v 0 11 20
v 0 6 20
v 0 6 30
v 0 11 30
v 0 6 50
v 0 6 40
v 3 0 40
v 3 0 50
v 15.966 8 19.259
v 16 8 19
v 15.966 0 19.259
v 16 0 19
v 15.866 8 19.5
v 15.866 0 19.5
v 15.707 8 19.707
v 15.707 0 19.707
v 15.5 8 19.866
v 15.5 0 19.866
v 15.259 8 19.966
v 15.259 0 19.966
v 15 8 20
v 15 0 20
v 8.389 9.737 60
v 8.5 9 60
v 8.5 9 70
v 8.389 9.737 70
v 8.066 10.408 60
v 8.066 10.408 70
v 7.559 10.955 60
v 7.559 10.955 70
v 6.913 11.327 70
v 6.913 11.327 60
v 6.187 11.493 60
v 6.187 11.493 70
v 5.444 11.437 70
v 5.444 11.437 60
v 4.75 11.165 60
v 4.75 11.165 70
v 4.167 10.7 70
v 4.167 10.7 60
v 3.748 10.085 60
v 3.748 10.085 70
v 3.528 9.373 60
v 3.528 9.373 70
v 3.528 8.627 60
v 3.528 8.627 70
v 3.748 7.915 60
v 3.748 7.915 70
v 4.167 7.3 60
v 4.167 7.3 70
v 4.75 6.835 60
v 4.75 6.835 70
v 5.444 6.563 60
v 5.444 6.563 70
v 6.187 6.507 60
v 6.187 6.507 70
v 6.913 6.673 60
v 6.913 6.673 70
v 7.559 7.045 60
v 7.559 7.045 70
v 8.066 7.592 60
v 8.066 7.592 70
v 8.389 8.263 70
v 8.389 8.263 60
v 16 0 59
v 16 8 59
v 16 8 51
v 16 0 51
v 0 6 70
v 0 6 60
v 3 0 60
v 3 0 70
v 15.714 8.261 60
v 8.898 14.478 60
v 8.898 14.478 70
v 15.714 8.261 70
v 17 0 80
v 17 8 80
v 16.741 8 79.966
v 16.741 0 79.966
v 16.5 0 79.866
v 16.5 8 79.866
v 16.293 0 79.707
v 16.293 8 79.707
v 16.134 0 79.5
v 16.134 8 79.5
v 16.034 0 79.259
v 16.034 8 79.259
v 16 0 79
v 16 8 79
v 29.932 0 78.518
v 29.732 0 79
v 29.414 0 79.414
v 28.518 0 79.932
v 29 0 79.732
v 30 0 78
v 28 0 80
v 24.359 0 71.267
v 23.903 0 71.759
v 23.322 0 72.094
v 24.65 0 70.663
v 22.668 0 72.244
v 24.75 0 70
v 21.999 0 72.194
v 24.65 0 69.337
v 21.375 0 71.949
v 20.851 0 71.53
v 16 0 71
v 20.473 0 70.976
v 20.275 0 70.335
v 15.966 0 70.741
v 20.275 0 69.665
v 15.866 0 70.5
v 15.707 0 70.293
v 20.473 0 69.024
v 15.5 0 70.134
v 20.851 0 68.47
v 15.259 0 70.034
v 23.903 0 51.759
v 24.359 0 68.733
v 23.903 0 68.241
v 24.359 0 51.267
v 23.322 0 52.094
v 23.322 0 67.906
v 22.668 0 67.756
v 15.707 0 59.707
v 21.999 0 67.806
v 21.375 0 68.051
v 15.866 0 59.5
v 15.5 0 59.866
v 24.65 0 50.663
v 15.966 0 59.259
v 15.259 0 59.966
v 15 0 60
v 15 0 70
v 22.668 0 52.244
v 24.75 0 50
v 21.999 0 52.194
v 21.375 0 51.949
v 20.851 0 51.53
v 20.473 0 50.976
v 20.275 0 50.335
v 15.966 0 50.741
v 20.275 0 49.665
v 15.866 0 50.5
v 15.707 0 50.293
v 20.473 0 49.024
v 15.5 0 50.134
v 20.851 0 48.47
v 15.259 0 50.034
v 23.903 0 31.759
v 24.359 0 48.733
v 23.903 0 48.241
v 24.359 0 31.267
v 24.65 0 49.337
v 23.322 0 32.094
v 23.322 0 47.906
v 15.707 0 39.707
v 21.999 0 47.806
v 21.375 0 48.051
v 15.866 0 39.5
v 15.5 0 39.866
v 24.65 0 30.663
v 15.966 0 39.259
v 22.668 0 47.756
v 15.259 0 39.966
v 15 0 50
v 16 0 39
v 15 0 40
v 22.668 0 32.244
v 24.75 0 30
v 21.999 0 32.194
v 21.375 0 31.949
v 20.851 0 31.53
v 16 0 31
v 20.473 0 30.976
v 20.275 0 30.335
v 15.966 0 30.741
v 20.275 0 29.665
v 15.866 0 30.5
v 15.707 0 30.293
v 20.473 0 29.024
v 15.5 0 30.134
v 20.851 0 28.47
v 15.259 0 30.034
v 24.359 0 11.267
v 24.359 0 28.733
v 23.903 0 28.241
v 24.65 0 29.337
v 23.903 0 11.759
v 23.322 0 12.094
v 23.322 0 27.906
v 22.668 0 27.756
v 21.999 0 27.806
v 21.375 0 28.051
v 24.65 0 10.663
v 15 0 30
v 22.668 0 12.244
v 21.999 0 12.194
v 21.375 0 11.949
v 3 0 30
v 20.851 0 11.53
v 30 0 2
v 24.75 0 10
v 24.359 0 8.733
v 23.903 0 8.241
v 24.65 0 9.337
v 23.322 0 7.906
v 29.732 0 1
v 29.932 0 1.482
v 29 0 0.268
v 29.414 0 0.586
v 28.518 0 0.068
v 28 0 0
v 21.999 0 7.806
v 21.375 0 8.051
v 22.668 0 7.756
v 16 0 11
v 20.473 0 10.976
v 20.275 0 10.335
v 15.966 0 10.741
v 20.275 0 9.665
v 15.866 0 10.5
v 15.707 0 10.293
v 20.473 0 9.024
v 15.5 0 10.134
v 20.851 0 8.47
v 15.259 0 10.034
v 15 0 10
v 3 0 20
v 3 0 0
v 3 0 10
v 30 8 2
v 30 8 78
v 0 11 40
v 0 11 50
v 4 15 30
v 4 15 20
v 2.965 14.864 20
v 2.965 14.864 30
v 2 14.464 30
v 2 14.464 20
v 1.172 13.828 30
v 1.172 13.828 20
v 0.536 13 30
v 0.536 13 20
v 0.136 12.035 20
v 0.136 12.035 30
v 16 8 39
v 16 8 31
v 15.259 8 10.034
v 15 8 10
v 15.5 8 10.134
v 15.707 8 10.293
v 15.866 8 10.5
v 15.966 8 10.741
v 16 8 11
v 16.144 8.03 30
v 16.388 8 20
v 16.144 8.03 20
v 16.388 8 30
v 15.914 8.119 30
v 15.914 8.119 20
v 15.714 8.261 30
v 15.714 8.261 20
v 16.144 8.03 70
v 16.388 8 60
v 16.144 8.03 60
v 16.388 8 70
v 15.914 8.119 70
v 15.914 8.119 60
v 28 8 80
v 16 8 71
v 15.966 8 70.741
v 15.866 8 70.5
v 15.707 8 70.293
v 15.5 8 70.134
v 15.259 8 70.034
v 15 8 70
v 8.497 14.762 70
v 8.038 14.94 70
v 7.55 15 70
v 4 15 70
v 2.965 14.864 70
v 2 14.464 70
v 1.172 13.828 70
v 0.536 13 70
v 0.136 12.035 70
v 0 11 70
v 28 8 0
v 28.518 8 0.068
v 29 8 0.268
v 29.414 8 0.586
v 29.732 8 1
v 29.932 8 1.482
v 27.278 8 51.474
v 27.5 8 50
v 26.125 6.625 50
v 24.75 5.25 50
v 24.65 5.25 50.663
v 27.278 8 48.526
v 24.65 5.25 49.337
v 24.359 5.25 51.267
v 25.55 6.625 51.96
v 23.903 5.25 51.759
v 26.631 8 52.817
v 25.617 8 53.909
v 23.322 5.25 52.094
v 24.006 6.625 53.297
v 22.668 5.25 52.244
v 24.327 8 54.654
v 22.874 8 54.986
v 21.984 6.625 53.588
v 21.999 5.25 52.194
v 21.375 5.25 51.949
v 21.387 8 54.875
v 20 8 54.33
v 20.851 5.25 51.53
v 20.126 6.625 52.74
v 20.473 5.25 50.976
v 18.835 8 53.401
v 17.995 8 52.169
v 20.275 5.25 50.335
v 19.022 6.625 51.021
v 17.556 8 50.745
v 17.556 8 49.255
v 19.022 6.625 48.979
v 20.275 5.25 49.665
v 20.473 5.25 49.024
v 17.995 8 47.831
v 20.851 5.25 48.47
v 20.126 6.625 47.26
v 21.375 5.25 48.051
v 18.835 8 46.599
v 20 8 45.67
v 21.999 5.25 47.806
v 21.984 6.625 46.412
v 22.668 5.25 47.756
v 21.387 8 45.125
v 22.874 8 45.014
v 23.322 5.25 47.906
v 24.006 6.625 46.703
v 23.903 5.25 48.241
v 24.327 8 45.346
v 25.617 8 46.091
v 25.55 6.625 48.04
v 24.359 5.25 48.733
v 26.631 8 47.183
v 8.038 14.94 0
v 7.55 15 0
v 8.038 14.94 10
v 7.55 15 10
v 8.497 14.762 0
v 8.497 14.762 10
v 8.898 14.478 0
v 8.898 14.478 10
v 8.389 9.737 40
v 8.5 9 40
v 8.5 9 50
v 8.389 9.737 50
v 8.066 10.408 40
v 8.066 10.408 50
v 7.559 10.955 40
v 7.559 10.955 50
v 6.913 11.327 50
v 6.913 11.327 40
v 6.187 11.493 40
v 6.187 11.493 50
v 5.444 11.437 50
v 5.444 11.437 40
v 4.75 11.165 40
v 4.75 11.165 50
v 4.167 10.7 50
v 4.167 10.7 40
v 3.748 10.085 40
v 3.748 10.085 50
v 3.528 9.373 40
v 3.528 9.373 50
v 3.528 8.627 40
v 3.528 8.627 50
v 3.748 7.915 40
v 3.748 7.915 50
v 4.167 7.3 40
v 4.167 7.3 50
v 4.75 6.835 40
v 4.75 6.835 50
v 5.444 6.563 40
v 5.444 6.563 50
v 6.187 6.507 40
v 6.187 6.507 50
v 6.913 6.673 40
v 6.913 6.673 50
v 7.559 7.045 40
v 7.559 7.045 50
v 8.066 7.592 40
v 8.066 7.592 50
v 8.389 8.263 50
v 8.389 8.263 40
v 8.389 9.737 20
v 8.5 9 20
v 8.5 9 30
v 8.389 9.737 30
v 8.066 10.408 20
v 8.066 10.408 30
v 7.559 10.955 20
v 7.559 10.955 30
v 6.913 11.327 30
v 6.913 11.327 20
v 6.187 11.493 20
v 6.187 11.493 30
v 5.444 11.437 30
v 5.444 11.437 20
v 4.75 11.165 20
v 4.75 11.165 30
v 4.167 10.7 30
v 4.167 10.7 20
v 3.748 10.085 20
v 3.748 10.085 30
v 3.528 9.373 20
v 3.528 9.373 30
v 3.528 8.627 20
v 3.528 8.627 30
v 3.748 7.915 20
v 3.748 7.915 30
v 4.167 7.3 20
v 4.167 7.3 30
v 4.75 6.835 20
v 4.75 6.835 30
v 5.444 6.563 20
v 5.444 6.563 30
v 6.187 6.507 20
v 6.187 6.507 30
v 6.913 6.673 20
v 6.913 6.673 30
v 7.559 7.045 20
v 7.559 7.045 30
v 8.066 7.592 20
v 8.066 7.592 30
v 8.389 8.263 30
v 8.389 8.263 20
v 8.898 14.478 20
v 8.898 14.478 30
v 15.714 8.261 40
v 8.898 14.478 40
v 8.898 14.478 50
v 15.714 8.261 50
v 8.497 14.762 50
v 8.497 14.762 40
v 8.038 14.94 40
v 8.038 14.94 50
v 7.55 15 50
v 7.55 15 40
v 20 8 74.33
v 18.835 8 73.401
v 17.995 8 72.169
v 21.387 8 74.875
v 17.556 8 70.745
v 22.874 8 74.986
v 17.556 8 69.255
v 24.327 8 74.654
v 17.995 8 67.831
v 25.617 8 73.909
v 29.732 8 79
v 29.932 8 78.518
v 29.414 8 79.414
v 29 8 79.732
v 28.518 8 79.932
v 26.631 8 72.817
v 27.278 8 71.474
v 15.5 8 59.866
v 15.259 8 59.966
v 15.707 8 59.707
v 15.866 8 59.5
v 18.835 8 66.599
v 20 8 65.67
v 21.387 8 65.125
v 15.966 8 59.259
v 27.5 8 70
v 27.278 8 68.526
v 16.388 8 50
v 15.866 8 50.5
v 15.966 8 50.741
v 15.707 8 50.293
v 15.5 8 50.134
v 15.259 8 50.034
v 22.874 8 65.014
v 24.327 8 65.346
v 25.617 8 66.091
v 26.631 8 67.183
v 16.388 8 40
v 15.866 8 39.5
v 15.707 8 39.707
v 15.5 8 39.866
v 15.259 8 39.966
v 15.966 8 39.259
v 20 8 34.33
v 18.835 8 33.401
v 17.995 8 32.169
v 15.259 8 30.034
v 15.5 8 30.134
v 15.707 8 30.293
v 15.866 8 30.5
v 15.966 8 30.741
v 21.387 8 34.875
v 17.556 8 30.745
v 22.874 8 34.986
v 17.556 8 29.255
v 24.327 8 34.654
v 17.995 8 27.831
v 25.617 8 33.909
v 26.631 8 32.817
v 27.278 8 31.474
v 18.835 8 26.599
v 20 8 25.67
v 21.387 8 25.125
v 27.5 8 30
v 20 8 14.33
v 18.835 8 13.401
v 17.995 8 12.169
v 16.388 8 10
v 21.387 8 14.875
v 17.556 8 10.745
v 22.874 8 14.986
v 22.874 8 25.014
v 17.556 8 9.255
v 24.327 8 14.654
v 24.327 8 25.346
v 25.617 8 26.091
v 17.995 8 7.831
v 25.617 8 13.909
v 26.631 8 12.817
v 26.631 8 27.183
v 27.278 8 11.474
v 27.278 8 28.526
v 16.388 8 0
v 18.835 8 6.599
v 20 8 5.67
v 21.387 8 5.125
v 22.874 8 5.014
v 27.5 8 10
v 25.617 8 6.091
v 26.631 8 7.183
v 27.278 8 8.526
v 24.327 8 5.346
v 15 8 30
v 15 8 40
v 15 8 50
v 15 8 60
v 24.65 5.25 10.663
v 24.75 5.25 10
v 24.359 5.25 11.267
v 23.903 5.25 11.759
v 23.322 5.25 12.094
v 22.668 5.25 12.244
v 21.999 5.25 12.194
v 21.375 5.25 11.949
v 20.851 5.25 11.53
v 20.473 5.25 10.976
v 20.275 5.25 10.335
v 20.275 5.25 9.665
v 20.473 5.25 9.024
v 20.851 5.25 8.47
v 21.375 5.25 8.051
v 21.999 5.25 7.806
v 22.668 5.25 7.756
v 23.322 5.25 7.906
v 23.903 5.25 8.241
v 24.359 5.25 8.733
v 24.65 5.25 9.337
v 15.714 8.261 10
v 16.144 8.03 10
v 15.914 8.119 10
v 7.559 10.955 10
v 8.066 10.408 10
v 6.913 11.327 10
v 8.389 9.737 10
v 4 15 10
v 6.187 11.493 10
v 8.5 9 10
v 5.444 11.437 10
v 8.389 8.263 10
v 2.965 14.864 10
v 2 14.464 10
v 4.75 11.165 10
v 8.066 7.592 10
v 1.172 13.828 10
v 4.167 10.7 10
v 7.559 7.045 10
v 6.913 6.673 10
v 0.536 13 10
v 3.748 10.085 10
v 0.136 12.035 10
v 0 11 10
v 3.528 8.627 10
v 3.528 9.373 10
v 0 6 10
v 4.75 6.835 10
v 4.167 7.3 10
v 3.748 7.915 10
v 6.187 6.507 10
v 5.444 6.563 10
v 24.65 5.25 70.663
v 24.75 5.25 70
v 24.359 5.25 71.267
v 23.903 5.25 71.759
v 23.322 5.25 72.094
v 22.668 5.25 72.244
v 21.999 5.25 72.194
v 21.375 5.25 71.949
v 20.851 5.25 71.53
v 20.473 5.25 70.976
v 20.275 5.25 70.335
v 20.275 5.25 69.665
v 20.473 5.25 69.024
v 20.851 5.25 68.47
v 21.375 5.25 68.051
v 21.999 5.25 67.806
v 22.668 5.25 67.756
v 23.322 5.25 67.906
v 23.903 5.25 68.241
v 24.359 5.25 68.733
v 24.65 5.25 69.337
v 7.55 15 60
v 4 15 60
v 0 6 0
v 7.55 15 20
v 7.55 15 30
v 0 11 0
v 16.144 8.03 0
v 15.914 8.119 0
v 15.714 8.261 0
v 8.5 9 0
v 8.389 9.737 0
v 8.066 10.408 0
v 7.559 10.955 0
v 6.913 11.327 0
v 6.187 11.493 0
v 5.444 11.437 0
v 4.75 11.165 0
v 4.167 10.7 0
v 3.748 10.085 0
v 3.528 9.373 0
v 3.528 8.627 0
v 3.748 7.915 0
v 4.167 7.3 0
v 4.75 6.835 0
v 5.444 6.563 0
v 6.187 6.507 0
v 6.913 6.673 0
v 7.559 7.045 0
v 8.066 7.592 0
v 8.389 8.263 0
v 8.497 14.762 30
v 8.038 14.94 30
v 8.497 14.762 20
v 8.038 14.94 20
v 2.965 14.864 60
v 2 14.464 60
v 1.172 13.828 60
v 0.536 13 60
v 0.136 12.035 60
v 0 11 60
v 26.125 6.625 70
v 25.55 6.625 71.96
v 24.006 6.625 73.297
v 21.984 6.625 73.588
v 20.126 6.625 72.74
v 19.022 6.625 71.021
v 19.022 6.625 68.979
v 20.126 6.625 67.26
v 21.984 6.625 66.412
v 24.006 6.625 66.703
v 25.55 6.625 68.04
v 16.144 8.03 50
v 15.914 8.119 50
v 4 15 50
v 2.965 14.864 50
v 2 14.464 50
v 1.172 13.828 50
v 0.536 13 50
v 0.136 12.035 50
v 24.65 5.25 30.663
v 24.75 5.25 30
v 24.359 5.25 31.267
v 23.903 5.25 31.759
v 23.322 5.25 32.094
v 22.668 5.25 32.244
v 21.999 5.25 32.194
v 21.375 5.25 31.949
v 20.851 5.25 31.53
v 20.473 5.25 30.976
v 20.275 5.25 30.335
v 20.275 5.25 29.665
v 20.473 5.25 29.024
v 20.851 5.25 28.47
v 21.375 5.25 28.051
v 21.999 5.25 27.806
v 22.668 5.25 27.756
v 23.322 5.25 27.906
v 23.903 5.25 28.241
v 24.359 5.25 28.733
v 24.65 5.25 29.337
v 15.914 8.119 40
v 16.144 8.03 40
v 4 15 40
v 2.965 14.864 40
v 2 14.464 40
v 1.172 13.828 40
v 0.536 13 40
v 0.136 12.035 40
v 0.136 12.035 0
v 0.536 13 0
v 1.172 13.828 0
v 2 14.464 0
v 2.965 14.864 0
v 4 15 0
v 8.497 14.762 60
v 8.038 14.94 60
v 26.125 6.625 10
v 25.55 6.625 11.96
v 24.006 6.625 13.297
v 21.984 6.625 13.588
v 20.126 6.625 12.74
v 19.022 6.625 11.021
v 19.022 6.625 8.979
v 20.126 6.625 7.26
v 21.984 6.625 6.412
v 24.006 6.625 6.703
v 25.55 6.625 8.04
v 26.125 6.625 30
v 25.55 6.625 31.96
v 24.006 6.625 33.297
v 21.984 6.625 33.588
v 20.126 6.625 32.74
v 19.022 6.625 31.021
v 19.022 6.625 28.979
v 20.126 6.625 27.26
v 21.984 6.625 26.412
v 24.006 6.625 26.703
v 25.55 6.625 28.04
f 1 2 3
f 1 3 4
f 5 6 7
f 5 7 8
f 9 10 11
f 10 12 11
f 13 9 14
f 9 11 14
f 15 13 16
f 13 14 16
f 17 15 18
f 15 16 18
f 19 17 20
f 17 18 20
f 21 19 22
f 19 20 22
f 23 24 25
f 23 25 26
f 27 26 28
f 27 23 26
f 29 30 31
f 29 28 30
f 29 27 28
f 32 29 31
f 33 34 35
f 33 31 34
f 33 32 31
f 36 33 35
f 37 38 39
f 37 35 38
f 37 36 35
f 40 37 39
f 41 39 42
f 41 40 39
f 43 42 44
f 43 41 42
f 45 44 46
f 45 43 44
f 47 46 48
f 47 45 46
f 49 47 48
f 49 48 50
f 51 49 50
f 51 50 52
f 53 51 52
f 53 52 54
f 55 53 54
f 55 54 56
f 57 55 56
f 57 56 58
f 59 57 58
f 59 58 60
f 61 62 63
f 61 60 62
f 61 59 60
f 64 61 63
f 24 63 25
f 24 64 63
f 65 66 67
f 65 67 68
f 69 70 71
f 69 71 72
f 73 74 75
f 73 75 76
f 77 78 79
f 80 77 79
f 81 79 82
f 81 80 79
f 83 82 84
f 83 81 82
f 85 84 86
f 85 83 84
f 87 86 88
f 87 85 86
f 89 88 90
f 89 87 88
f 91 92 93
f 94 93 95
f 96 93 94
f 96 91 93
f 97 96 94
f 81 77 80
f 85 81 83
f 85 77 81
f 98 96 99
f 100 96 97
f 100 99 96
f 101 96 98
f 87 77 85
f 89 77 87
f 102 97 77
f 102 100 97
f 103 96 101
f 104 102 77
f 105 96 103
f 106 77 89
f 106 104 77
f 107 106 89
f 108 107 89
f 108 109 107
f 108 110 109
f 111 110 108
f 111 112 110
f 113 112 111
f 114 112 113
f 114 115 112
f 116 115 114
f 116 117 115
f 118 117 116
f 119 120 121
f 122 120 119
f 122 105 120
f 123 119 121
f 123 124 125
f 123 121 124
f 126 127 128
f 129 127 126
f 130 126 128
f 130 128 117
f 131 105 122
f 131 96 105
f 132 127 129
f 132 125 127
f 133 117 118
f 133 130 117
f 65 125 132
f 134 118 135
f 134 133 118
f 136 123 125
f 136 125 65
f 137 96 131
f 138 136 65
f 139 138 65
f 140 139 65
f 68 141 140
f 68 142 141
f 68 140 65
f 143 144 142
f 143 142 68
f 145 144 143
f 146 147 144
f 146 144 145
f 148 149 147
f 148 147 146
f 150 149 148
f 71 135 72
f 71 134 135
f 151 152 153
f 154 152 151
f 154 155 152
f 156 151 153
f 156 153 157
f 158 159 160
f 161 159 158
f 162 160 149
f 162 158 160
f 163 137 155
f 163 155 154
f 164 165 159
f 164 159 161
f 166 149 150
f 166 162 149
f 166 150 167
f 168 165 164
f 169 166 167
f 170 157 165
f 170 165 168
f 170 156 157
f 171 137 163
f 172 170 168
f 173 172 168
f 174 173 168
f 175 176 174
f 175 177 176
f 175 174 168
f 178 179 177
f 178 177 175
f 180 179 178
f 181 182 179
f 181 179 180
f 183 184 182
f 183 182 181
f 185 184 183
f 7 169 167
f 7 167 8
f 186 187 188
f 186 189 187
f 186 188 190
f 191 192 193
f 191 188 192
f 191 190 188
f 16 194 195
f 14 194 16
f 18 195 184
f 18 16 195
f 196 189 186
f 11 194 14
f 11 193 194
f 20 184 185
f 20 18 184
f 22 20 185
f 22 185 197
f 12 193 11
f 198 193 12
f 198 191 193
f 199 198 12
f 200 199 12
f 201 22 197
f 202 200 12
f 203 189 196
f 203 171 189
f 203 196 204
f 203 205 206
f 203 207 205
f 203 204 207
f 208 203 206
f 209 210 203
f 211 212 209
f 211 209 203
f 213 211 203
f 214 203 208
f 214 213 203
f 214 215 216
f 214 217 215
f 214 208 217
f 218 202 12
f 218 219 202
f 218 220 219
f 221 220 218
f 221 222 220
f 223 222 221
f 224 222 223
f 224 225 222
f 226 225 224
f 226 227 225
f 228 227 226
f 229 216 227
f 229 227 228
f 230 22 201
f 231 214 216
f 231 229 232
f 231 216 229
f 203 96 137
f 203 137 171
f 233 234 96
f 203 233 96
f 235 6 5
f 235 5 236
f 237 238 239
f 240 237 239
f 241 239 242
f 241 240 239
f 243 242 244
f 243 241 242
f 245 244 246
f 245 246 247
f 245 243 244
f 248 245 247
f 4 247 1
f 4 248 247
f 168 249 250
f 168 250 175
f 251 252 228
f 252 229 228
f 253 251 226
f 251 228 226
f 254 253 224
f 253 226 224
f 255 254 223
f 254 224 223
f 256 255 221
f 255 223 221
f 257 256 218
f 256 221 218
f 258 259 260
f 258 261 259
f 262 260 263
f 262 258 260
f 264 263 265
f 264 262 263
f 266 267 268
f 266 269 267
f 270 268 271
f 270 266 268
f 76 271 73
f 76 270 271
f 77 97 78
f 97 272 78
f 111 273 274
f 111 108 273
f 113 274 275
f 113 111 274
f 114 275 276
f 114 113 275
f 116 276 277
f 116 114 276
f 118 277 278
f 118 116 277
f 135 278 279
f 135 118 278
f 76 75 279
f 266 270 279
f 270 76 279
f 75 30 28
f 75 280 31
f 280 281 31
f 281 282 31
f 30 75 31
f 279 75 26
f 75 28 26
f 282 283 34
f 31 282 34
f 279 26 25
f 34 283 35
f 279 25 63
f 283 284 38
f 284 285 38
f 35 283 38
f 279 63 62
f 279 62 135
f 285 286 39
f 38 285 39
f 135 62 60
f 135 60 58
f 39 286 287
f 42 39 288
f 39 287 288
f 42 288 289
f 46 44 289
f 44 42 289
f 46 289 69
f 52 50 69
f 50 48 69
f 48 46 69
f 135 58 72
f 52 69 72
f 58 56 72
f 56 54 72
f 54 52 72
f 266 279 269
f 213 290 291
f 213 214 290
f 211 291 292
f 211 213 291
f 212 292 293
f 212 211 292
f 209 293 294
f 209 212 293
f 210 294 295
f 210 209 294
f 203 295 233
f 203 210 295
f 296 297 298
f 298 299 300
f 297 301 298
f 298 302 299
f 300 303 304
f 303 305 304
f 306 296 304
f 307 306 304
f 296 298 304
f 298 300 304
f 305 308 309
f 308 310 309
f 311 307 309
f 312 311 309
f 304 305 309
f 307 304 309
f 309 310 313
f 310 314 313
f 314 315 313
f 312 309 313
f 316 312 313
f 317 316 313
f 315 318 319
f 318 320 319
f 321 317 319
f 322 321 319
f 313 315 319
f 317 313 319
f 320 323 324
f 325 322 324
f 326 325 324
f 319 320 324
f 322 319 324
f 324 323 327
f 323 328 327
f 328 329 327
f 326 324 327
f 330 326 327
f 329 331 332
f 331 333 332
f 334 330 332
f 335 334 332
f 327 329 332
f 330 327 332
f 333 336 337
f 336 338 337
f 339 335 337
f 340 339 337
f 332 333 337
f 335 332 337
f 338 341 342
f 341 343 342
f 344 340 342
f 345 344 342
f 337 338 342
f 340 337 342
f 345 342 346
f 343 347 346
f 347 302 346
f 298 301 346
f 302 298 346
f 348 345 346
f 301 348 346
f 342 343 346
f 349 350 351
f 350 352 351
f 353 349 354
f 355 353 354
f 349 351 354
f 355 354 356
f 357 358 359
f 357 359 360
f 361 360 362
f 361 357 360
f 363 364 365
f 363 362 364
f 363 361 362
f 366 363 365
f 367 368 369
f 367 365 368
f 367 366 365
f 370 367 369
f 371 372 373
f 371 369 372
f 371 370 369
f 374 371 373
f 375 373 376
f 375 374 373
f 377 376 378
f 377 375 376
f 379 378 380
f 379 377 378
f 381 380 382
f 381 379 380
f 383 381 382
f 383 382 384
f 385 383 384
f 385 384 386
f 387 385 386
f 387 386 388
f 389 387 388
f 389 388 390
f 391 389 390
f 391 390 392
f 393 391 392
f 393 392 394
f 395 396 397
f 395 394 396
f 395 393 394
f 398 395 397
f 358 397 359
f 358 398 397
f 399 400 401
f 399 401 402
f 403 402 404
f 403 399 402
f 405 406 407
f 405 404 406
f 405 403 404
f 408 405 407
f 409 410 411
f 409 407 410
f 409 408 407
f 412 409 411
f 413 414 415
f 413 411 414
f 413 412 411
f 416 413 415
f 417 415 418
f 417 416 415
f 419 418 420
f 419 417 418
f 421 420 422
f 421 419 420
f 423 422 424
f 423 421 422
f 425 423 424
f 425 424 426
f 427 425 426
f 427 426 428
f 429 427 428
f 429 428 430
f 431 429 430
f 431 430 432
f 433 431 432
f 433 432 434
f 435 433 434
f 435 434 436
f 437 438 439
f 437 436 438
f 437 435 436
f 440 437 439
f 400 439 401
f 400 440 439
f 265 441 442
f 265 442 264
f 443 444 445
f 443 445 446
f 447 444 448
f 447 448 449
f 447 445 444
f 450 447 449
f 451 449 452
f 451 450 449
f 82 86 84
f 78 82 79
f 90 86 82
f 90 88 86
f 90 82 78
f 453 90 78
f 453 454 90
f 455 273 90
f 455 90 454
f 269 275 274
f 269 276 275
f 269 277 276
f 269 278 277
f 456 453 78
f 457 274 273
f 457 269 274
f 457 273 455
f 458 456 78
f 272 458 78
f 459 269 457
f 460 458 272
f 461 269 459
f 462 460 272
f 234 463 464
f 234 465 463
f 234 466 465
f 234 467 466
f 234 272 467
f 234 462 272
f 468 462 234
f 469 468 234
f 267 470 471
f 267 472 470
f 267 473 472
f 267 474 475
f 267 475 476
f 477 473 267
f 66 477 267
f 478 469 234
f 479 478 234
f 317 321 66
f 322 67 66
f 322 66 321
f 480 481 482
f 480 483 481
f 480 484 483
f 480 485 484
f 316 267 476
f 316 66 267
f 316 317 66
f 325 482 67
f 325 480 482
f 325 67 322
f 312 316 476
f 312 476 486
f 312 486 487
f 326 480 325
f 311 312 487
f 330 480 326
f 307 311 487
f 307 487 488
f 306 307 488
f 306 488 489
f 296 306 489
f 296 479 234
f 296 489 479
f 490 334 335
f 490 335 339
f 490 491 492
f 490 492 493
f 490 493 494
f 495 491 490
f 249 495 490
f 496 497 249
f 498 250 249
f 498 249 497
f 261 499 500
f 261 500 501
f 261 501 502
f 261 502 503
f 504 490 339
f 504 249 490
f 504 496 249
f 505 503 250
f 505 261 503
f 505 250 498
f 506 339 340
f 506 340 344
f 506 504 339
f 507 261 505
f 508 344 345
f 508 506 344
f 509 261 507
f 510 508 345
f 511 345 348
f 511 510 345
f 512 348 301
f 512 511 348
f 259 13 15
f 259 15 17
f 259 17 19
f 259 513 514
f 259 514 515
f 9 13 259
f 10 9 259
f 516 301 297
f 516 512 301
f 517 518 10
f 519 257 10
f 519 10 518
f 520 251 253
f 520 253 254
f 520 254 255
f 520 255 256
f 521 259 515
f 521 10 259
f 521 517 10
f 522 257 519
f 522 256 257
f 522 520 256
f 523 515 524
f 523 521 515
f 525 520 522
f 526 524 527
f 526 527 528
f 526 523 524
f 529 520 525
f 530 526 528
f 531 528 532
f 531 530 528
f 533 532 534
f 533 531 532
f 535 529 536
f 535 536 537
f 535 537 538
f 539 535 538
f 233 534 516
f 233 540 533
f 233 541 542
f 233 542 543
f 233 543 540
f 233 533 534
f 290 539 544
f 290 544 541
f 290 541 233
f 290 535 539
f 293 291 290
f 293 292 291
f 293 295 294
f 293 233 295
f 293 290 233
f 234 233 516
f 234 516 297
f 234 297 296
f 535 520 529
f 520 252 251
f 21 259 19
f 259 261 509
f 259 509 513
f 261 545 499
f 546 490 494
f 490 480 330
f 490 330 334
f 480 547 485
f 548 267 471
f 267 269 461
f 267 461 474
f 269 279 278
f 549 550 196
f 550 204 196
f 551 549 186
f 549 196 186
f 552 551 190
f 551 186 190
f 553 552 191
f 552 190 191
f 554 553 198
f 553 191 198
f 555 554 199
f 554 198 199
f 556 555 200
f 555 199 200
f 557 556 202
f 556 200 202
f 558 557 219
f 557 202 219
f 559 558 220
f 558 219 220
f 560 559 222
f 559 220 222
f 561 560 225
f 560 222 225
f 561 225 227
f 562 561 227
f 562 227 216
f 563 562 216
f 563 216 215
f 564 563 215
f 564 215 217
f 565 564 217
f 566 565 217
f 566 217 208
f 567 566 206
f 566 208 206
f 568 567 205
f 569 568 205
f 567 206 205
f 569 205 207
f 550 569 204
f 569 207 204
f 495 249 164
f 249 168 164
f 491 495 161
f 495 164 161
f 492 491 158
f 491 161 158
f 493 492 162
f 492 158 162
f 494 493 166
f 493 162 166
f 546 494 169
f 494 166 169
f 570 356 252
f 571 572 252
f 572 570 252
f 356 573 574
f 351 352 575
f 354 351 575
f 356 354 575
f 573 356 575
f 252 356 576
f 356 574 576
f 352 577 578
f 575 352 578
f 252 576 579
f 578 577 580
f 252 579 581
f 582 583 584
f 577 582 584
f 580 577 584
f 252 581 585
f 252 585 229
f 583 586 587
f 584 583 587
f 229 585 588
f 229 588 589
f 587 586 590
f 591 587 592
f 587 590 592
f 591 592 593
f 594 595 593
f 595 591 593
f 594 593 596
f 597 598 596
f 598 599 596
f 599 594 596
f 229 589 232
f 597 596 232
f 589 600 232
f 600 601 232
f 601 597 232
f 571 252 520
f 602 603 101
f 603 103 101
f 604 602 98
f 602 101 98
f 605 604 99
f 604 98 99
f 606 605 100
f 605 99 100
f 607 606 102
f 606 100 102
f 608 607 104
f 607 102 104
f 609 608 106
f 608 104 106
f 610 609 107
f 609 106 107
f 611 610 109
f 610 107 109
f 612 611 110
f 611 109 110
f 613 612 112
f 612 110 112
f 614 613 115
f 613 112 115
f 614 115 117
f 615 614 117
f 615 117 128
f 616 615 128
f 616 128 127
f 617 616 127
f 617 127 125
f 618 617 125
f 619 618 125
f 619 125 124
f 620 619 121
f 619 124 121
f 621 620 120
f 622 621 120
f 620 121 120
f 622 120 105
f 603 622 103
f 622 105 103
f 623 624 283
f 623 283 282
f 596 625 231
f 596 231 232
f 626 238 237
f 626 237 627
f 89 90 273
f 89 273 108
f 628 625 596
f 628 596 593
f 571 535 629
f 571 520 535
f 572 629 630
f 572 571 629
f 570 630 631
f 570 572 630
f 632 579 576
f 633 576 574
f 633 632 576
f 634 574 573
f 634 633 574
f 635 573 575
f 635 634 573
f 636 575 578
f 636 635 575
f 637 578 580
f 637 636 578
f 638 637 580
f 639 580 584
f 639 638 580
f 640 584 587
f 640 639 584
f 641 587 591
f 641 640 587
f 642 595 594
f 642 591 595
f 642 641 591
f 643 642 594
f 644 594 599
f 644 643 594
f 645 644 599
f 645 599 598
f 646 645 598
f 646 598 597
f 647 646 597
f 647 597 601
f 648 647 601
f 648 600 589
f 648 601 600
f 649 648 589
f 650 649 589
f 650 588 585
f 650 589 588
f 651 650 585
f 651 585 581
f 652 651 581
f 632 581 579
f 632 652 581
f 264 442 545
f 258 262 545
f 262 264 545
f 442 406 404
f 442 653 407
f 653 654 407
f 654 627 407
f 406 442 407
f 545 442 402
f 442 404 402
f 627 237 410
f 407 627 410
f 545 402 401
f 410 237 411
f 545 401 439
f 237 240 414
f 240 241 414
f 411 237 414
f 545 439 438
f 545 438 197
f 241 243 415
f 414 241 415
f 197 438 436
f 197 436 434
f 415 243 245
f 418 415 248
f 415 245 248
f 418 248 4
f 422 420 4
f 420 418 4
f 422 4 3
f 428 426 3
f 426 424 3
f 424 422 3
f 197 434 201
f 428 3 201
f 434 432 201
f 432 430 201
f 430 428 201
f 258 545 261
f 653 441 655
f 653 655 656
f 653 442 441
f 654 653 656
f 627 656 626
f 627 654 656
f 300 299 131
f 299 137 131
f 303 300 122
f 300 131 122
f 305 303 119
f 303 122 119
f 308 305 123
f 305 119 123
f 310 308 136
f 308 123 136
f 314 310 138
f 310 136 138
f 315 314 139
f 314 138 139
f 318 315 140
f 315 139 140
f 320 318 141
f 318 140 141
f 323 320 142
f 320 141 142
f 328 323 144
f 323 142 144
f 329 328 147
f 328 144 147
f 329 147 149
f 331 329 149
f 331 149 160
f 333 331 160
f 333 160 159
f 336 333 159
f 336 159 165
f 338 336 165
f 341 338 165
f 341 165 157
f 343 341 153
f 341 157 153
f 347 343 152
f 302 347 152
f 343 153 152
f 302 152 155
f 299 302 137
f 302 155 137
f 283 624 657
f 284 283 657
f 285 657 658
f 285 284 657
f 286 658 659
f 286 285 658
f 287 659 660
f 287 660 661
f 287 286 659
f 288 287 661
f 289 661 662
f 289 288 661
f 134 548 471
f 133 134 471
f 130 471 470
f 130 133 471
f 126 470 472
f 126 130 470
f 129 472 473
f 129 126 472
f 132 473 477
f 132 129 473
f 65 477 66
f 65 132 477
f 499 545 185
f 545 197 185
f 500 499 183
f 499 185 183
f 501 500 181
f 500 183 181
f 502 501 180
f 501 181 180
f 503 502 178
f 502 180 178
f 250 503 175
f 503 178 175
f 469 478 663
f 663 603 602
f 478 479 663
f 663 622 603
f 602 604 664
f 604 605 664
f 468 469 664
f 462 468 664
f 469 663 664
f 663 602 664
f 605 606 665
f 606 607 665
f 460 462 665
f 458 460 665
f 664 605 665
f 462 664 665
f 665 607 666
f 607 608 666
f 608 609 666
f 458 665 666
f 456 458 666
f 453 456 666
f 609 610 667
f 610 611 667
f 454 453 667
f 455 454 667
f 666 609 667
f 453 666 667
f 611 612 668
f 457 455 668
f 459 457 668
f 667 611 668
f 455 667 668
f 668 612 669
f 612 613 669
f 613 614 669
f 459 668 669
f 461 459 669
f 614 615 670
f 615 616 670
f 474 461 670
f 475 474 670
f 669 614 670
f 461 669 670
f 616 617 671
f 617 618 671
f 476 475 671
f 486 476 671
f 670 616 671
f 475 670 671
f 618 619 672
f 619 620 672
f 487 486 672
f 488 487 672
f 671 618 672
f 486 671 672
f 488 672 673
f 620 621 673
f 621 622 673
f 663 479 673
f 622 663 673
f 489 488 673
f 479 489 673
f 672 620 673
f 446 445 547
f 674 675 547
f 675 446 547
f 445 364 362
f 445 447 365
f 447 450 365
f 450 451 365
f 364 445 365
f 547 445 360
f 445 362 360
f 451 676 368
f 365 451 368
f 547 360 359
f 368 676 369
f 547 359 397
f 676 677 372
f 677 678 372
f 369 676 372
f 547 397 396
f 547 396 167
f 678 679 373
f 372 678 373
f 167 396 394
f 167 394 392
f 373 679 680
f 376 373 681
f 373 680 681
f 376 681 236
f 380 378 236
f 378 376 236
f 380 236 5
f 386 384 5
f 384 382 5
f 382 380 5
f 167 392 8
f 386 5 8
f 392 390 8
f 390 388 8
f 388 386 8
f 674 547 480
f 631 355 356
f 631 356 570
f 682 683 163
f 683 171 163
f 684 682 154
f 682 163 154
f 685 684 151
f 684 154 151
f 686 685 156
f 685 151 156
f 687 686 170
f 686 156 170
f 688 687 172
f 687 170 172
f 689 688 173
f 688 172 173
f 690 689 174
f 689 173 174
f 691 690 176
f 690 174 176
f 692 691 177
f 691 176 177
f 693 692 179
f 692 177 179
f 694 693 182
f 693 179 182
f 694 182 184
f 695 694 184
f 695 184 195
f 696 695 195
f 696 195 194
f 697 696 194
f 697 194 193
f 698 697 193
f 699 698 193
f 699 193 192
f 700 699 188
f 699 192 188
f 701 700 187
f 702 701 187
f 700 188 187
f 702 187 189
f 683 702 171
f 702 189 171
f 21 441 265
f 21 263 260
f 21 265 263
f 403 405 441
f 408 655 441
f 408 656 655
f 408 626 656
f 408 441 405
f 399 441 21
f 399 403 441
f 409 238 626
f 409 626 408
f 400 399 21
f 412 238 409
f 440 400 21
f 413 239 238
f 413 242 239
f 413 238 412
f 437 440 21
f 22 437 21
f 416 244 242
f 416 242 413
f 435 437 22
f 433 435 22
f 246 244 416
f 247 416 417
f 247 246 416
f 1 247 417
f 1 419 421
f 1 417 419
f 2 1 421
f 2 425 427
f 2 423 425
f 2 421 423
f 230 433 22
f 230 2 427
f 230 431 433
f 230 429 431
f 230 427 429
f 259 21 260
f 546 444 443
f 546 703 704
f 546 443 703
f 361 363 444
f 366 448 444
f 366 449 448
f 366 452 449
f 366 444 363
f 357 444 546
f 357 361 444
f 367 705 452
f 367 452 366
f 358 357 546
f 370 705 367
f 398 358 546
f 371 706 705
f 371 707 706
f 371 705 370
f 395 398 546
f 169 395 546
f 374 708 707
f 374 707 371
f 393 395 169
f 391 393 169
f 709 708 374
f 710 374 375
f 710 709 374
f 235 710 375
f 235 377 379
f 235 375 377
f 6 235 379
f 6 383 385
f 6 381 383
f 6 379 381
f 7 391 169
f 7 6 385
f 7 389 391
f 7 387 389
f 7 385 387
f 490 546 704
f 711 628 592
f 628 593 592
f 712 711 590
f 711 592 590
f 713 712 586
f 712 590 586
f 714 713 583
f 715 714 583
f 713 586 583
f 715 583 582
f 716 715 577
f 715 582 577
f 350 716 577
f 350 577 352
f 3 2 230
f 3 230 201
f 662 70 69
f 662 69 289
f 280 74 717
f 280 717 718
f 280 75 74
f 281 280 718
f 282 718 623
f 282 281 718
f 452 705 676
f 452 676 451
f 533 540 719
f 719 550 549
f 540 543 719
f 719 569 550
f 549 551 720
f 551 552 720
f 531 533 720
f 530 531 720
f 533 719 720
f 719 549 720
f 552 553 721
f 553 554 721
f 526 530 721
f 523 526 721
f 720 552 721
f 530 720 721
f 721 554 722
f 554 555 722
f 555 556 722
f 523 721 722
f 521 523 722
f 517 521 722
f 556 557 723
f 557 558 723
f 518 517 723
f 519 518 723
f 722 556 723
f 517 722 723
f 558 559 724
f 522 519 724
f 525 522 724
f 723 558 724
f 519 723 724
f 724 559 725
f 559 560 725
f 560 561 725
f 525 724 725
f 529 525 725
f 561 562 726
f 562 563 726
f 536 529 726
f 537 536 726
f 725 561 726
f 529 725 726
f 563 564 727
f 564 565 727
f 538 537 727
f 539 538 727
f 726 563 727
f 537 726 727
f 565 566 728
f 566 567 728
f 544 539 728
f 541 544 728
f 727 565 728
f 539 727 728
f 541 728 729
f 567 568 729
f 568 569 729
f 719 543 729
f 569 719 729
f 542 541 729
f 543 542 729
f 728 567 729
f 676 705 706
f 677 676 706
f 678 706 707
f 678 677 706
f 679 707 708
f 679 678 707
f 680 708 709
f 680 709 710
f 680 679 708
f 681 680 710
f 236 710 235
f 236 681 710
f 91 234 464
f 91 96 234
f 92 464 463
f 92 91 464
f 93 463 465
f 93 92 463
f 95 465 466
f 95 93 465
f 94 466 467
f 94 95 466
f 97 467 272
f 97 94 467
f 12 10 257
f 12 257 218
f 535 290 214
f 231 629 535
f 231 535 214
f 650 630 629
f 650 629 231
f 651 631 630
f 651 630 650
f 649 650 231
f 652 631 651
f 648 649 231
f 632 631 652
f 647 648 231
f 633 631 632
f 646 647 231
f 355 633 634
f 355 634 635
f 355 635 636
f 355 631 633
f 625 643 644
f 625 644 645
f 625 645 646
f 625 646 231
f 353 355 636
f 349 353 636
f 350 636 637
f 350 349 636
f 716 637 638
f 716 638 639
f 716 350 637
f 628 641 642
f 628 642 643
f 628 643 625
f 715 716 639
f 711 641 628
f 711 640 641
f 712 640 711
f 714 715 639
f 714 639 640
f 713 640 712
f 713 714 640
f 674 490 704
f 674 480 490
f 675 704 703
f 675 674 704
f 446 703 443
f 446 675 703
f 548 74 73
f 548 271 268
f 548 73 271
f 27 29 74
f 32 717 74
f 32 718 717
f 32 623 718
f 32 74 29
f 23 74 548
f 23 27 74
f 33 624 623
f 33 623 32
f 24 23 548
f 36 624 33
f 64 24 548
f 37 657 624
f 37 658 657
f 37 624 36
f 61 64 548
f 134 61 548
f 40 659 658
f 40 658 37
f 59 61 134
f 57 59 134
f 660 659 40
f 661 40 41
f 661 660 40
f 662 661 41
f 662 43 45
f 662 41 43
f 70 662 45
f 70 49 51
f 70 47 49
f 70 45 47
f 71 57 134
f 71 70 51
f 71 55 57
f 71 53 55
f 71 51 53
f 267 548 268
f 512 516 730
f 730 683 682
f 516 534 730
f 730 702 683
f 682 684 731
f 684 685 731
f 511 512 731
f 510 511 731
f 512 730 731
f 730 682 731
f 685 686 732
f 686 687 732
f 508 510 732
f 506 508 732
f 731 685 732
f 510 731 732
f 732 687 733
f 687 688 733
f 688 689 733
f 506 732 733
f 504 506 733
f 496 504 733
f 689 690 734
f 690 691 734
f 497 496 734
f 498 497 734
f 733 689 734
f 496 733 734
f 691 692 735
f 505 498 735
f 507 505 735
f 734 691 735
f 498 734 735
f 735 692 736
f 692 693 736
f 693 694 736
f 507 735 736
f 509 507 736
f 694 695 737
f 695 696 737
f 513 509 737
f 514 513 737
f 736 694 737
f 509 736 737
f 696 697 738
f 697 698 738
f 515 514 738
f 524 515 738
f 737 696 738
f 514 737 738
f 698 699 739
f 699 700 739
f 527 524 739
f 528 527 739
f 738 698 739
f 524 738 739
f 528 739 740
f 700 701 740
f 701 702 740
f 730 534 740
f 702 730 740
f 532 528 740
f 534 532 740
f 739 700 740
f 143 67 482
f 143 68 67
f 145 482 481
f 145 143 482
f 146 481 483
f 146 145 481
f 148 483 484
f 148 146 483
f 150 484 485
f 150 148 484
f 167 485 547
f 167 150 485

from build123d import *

# Parameters (mm, degrees)
SKETCH_R         = 2.5
PAD_DEPTH        = 80
SKETCH001_W      = 15
SKETCH001_H      = 10
POCKET_DEPTH     = 16
HOLE_D           = 4.5
HOLE_CSINK_D     = 10
HOLE_CSINK_ANGLE = 90
FILLET_R         = 4
FILLET001_R      = 2
CHAMFER_SIZE2    = 6
CHAMFER_SIZE     = 3
CHAMFER001_SIZE2 = 6
CHAMFER001_SIZE  = 3
FILLET002_R      = 1
FILLET003_R      = 1
FILLET004_R      = 2


with BuildPart() as part:
    # Sketch → Pad (new body)
    with BuildSketch(Plane.XY):
        Polygon((0, 0), (0, 15), (8.325291, 15), (16, 8), (30, 8), (30, 0), align=None)
        with Locations((6, 9)):
            Circle(SKETCH_R, mode=Mode.SUBTRACT)
    extrude(amount=PAD_DEPTH)

    # Sketch001 (on Face1 of Pad) → Pocket (cut)
    with BuildSketch(Plane(origin=(0, 0, 0), x_dir=(0, -1, 0), z_dir=(-1, 0, 0))):
        with Locations((-7.5, 15)):
            Rectangle(SKETCH001_W, SKETCH001_H)
        with Locations((-7.5, 35)):
            Rectangle(SKETCH001_W, SKETCH001_H)
        with Locations((-7.5, 55)):
            Rectangle(SKETCH001_W, SKETCH001_H)
        with Locations((-7.5, 75)):
            Rectangle(SKETCH001_W, SKETCH001_H)
    extrude(amount=-POCKET_DEPTH, mode=Mode.SUBTRACT)

    # Hole (through all)
    with Locations(Plane(origin=(0, 8, 0), x_dir=(-1, 0, 0), z_dir=(0, 1, 0))):
        with Locations((-22.5, 70), (-22.5, 50), (-22.5, 30), (-22.5, 10)):
            CounterSinkHole(HOLE_D / 2, HOLE_CSINK_D / 2, counter_sink_angle=HOLE_CSINK_ANGLE)

    # Fillet
    fillet_edges = [part.edges().sort_by_distance(p)[0] for p in [
        (0, 15, 5),
        (0, 15, 25),
        (0, 15, 45),
        (0, 15, 65),
    ]]
    fillet(fillet_edges, radius=FILLET_R)

    # Fillet001
    fillet001_edges = [part.edges().sort_by_distance(p)[0] for p in [
        (8.325291, 15, 5),
        (8.325291, 15, 25),
        (8.325291, 15, 45),
        (8.325291, 15, 65),
    ]]
    fillet(fillet001_edges, radius=FILLET001_R)

    # Chamfer
    chamfer_edges = [part.edges().sort_by_distance(p)[0] for p in [
        (0, 0, 25),
        (0, 0, 45),
        (0, 0, 65),
    ]]
    chamfer_side = part.faces().sort_by_distance((17.359651, 0, 38.113633))[0]
    chamfer(chamfer_edges, length=CHAMFER_SIZE, length2=CHAMFER_SIZE2, reference=chamfer_side)

    # Chamfer001
    chamfer001_edges = [part.edges().sort_by_distance(p)[0] for p in [
        (0, 0, 5),
    ]]
    chamfer001_side = part.faces().sort_by_distance((18.248211, 0, 37.727814))[0]
    chamfer(chamfer001_edges, length=CHAMFER001_SIZE, length2=CHAMFER001_SIZE2, reference=chamfer001_side)

    # Fillet002
    fillet002_edges = [part.edges().sort_by_distance(p)[0] for p in [
        (16, 8, 5),
        (16, 8, 25),
        (16, 8, 45),
        (16, 8, 65),
    ]]
    fillet(fillet002_edges, radius=FILLET002_R)

    # Fillet003
    fillet003_edges = [part.edges().sort_by_distance(p)[0] for p in [
        (16, 4, 10),
        (16, 4, 30),
        (16, 4, 50),
        (16, 4, 70),
        (16, 4, 80),
        (16, 4, 20),
        (16, 4, 40),
        (16, 4, 60),
    ]]
    fillet(fillet003_edges, radius=FILLET003_R)

    # Fillet004
    fillet004_edges = [part.edges().sort_by_distance(p)[0] for p in [
        (30, 4, 0),
        (30, 4, 80),
    ]]
    fillet(fillet004_edges, radius=FILLET004_R)


solid = part.part
